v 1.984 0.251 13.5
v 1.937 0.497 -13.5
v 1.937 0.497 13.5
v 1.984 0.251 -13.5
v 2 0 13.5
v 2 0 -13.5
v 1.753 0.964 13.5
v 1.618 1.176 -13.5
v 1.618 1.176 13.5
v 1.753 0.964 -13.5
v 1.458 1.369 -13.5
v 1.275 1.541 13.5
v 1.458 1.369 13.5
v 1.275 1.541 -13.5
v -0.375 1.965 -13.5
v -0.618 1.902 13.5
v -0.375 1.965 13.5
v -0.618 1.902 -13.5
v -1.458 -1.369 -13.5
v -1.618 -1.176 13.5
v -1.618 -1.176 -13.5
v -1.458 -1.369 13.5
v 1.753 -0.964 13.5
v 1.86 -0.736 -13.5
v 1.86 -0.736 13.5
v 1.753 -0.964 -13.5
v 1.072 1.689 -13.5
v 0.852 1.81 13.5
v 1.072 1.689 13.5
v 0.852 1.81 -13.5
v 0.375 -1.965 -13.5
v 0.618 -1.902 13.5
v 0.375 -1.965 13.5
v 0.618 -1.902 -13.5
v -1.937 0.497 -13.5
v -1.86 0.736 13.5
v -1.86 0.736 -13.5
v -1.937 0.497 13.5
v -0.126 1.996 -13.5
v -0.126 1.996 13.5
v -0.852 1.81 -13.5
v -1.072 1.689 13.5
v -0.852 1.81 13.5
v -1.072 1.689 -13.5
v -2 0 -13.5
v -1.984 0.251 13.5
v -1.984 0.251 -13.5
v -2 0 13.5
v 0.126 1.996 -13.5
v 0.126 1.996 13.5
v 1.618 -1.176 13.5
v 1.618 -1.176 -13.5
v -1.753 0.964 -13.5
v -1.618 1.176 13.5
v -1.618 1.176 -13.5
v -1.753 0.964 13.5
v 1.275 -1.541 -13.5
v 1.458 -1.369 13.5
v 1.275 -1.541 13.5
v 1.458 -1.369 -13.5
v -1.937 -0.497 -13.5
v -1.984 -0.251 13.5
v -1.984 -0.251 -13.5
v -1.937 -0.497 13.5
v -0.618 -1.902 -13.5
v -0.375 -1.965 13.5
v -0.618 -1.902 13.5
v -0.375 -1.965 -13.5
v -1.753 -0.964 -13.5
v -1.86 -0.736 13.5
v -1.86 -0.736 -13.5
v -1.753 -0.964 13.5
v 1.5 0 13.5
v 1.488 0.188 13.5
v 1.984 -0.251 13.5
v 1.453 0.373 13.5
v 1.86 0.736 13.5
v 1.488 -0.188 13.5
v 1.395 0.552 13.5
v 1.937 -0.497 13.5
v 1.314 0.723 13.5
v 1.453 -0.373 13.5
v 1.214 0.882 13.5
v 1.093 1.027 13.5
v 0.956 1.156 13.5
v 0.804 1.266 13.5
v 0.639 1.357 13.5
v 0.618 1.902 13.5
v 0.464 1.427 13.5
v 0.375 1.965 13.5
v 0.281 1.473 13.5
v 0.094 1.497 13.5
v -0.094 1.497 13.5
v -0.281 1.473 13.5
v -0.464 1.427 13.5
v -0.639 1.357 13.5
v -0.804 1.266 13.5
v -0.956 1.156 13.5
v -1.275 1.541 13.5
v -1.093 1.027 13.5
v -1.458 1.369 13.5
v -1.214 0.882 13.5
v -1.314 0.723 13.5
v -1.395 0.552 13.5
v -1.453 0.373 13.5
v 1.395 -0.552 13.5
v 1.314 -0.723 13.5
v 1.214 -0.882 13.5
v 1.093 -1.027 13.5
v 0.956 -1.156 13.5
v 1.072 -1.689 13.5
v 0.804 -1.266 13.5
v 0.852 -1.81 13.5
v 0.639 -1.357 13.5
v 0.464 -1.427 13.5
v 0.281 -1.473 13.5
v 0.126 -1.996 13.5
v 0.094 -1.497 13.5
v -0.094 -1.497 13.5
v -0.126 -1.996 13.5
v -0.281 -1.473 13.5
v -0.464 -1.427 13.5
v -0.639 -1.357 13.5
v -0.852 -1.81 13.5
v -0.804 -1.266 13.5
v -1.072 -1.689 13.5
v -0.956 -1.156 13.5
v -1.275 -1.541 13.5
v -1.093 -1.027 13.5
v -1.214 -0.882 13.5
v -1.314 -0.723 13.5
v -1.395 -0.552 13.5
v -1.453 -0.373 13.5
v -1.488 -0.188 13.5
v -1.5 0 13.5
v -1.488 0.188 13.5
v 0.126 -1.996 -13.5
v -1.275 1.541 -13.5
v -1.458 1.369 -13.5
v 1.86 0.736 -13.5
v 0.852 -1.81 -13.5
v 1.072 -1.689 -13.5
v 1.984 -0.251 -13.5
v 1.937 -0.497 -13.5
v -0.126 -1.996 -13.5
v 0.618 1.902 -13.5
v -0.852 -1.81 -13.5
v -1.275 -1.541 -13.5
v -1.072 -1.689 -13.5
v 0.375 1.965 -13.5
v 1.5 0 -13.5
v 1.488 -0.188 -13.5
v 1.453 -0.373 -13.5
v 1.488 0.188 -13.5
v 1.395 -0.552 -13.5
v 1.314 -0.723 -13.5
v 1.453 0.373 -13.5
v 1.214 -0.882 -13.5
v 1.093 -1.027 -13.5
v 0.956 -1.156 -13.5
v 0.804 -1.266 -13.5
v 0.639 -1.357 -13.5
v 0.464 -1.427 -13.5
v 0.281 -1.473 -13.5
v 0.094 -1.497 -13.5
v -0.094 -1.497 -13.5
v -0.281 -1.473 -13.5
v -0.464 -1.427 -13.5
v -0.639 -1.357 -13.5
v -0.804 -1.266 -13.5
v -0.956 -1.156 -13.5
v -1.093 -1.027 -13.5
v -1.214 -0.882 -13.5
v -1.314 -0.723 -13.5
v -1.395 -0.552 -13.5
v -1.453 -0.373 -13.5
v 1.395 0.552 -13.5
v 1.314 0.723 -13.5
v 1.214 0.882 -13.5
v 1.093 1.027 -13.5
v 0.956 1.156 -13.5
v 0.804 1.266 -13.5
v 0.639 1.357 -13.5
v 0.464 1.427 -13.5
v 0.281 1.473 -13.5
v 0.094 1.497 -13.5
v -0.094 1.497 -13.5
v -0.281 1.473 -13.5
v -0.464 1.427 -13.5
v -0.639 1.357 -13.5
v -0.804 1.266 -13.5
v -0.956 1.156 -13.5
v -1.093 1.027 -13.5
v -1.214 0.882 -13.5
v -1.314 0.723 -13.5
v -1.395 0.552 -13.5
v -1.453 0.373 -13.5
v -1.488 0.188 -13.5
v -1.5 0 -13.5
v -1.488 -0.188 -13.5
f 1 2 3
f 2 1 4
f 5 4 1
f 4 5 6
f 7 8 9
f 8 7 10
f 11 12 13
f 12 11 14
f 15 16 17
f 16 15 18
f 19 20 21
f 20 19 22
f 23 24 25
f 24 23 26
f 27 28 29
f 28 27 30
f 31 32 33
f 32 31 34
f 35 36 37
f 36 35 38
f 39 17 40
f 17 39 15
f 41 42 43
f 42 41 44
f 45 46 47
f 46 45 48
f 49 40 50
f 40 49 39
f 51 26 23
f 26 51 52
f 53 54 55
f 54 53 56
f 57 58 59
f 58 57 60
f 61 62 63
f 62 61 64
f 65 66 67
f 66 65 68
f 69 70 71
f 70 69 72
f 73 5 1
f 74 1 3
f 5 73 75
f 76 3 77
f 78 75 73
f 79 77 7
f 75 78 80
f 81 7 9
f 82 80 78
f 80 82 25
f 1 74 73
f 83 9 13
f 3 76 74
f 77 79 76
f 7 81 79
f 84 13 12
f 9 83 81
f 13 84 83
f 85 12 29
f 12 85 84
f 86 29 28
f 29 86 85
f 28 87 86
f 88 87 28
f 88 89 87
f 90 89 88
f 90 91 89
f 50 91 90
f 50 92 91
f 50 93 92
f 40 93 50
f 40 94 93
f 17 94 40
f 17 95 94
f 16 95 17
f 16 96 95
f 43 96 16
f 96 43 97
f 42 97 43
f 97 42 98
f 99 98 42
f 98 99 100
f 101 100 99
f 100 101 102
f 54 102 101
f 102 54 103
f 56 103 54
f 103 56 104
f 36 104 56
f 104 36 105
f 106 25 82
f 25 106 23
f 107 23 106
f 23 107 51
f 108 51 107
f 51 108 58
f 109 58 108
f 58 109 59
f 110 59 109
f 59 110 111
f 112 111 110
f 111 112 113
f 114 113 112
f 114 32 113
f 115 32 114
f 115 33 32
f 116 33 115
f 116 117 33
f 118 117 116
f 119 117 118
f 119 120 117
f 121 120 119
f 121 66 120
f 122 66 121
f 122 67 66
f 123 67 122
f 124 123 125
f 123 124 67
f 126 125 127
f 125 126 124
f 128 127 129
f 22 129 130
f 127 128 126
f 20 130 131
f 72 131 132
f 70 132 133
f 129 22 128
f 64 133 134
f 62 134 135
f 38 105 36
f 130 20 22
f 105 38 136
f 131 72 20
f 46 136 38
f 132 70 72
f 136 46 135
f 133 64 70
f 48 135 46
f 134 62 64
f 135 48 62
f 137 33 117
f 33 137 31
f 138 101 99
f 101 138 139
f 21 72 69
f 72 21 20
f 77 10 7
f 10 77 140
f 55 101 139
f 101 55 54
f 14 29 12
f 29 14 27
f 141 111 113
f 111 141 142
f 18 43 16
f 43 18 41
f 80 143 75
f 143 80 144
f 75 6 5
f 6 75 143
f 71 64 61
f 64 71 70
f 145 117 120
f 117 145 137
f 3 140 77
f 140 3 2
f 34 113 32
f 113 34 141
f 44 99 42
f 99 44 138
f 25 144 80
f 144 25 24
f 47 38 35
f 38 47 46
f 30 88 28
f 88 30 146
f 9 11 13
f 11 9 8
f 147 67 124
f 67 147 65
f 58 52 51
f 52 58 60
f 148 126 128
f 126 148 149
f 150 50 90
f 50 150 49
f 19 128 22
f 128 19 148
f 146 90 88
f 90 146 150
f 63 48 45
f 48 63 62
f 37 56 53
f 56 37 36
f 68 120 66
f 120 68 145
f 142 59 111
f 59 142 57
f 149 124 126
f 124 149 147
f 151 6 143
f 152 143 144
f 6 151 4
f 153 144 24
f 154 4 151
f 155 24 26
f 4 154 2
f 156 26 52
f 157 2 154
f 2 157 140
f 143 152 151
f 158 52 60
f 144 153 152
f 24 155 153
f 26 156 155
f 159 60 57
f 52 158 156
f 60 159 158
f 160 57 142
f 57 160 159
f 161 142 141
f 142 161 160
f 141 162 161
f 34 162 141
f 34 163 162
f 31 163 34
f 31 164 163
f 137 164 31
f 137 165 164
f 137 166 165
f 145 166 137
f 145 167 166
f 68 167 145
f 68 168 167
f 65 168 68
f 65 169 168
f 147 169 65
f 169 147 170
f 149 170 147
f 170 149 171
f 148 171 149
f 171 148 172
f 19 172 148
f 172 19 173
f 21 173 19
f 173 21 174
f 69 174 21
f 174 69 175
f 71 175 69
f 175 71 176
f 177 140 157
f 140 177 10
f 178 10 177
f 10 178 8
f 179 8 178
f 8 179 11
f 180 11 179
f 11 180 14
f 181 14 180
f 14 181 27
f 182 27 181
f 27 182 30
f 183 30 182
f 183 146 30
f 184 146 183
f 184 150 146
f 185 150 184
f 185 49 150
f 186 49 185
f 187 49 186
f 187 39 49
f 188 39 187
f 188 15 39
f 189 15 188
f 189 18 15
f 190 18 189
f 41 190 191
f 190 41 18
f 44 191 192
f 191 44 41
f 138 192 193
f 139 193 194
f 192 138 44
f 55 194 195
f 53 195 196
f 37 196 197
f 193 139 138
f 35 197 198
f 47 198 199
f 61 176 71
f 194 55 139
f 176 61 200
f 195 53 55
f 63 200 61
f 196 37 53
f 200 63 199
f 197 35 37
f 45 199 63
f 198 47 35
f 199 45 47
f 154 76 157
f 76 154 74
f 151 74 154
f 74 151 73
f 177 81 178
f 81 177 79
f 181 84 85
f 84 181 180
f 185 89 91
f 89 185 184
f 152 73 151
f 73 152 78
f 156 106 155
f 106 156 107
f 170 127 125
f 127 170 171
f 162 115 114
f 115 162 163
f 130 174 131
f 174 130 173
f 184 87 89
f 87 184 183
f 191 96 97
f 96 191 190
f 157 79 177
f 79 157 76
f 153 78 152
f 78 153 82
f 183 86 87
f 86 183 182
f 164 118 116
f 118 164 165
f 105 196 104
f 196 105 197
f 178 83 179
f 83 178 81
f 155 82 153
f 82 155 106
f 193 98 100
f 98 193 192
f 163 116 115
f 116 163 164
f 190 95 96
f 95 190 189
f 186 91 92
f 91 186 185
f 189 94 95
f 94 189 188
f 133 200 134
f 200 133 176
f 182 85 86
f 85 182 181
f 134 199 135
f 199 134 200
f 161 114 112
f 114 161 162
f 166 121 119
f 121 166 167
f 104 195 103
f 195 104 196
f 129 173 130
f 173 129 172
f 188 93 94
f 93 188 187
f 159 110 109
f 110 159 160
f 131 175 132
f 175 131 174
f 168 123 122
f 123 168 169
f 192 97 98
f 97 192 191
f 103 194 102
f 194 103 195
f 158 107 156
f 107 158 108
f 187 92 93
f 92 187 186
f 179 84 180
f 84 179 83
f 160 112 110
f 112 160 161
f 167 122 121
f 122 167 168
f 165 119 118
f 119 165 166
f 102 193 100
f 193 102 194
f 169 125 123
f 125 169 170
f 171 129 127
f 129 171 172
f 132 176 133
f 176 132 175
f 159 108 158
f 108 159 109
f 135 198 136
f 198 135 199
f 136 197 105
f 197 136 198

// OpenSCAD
$fn = 50;


difference() {
	union() {
		translate(v = [0, 0, -13.5000000000]) {
			cylinder(h = 27, r = 2.0000000000);
		}
	}
	union() {
		translate(v = [0, 0, -100.0000000000]) {
			cylinder(h = 200, r = 1.5000000000);
		}
	}
}
